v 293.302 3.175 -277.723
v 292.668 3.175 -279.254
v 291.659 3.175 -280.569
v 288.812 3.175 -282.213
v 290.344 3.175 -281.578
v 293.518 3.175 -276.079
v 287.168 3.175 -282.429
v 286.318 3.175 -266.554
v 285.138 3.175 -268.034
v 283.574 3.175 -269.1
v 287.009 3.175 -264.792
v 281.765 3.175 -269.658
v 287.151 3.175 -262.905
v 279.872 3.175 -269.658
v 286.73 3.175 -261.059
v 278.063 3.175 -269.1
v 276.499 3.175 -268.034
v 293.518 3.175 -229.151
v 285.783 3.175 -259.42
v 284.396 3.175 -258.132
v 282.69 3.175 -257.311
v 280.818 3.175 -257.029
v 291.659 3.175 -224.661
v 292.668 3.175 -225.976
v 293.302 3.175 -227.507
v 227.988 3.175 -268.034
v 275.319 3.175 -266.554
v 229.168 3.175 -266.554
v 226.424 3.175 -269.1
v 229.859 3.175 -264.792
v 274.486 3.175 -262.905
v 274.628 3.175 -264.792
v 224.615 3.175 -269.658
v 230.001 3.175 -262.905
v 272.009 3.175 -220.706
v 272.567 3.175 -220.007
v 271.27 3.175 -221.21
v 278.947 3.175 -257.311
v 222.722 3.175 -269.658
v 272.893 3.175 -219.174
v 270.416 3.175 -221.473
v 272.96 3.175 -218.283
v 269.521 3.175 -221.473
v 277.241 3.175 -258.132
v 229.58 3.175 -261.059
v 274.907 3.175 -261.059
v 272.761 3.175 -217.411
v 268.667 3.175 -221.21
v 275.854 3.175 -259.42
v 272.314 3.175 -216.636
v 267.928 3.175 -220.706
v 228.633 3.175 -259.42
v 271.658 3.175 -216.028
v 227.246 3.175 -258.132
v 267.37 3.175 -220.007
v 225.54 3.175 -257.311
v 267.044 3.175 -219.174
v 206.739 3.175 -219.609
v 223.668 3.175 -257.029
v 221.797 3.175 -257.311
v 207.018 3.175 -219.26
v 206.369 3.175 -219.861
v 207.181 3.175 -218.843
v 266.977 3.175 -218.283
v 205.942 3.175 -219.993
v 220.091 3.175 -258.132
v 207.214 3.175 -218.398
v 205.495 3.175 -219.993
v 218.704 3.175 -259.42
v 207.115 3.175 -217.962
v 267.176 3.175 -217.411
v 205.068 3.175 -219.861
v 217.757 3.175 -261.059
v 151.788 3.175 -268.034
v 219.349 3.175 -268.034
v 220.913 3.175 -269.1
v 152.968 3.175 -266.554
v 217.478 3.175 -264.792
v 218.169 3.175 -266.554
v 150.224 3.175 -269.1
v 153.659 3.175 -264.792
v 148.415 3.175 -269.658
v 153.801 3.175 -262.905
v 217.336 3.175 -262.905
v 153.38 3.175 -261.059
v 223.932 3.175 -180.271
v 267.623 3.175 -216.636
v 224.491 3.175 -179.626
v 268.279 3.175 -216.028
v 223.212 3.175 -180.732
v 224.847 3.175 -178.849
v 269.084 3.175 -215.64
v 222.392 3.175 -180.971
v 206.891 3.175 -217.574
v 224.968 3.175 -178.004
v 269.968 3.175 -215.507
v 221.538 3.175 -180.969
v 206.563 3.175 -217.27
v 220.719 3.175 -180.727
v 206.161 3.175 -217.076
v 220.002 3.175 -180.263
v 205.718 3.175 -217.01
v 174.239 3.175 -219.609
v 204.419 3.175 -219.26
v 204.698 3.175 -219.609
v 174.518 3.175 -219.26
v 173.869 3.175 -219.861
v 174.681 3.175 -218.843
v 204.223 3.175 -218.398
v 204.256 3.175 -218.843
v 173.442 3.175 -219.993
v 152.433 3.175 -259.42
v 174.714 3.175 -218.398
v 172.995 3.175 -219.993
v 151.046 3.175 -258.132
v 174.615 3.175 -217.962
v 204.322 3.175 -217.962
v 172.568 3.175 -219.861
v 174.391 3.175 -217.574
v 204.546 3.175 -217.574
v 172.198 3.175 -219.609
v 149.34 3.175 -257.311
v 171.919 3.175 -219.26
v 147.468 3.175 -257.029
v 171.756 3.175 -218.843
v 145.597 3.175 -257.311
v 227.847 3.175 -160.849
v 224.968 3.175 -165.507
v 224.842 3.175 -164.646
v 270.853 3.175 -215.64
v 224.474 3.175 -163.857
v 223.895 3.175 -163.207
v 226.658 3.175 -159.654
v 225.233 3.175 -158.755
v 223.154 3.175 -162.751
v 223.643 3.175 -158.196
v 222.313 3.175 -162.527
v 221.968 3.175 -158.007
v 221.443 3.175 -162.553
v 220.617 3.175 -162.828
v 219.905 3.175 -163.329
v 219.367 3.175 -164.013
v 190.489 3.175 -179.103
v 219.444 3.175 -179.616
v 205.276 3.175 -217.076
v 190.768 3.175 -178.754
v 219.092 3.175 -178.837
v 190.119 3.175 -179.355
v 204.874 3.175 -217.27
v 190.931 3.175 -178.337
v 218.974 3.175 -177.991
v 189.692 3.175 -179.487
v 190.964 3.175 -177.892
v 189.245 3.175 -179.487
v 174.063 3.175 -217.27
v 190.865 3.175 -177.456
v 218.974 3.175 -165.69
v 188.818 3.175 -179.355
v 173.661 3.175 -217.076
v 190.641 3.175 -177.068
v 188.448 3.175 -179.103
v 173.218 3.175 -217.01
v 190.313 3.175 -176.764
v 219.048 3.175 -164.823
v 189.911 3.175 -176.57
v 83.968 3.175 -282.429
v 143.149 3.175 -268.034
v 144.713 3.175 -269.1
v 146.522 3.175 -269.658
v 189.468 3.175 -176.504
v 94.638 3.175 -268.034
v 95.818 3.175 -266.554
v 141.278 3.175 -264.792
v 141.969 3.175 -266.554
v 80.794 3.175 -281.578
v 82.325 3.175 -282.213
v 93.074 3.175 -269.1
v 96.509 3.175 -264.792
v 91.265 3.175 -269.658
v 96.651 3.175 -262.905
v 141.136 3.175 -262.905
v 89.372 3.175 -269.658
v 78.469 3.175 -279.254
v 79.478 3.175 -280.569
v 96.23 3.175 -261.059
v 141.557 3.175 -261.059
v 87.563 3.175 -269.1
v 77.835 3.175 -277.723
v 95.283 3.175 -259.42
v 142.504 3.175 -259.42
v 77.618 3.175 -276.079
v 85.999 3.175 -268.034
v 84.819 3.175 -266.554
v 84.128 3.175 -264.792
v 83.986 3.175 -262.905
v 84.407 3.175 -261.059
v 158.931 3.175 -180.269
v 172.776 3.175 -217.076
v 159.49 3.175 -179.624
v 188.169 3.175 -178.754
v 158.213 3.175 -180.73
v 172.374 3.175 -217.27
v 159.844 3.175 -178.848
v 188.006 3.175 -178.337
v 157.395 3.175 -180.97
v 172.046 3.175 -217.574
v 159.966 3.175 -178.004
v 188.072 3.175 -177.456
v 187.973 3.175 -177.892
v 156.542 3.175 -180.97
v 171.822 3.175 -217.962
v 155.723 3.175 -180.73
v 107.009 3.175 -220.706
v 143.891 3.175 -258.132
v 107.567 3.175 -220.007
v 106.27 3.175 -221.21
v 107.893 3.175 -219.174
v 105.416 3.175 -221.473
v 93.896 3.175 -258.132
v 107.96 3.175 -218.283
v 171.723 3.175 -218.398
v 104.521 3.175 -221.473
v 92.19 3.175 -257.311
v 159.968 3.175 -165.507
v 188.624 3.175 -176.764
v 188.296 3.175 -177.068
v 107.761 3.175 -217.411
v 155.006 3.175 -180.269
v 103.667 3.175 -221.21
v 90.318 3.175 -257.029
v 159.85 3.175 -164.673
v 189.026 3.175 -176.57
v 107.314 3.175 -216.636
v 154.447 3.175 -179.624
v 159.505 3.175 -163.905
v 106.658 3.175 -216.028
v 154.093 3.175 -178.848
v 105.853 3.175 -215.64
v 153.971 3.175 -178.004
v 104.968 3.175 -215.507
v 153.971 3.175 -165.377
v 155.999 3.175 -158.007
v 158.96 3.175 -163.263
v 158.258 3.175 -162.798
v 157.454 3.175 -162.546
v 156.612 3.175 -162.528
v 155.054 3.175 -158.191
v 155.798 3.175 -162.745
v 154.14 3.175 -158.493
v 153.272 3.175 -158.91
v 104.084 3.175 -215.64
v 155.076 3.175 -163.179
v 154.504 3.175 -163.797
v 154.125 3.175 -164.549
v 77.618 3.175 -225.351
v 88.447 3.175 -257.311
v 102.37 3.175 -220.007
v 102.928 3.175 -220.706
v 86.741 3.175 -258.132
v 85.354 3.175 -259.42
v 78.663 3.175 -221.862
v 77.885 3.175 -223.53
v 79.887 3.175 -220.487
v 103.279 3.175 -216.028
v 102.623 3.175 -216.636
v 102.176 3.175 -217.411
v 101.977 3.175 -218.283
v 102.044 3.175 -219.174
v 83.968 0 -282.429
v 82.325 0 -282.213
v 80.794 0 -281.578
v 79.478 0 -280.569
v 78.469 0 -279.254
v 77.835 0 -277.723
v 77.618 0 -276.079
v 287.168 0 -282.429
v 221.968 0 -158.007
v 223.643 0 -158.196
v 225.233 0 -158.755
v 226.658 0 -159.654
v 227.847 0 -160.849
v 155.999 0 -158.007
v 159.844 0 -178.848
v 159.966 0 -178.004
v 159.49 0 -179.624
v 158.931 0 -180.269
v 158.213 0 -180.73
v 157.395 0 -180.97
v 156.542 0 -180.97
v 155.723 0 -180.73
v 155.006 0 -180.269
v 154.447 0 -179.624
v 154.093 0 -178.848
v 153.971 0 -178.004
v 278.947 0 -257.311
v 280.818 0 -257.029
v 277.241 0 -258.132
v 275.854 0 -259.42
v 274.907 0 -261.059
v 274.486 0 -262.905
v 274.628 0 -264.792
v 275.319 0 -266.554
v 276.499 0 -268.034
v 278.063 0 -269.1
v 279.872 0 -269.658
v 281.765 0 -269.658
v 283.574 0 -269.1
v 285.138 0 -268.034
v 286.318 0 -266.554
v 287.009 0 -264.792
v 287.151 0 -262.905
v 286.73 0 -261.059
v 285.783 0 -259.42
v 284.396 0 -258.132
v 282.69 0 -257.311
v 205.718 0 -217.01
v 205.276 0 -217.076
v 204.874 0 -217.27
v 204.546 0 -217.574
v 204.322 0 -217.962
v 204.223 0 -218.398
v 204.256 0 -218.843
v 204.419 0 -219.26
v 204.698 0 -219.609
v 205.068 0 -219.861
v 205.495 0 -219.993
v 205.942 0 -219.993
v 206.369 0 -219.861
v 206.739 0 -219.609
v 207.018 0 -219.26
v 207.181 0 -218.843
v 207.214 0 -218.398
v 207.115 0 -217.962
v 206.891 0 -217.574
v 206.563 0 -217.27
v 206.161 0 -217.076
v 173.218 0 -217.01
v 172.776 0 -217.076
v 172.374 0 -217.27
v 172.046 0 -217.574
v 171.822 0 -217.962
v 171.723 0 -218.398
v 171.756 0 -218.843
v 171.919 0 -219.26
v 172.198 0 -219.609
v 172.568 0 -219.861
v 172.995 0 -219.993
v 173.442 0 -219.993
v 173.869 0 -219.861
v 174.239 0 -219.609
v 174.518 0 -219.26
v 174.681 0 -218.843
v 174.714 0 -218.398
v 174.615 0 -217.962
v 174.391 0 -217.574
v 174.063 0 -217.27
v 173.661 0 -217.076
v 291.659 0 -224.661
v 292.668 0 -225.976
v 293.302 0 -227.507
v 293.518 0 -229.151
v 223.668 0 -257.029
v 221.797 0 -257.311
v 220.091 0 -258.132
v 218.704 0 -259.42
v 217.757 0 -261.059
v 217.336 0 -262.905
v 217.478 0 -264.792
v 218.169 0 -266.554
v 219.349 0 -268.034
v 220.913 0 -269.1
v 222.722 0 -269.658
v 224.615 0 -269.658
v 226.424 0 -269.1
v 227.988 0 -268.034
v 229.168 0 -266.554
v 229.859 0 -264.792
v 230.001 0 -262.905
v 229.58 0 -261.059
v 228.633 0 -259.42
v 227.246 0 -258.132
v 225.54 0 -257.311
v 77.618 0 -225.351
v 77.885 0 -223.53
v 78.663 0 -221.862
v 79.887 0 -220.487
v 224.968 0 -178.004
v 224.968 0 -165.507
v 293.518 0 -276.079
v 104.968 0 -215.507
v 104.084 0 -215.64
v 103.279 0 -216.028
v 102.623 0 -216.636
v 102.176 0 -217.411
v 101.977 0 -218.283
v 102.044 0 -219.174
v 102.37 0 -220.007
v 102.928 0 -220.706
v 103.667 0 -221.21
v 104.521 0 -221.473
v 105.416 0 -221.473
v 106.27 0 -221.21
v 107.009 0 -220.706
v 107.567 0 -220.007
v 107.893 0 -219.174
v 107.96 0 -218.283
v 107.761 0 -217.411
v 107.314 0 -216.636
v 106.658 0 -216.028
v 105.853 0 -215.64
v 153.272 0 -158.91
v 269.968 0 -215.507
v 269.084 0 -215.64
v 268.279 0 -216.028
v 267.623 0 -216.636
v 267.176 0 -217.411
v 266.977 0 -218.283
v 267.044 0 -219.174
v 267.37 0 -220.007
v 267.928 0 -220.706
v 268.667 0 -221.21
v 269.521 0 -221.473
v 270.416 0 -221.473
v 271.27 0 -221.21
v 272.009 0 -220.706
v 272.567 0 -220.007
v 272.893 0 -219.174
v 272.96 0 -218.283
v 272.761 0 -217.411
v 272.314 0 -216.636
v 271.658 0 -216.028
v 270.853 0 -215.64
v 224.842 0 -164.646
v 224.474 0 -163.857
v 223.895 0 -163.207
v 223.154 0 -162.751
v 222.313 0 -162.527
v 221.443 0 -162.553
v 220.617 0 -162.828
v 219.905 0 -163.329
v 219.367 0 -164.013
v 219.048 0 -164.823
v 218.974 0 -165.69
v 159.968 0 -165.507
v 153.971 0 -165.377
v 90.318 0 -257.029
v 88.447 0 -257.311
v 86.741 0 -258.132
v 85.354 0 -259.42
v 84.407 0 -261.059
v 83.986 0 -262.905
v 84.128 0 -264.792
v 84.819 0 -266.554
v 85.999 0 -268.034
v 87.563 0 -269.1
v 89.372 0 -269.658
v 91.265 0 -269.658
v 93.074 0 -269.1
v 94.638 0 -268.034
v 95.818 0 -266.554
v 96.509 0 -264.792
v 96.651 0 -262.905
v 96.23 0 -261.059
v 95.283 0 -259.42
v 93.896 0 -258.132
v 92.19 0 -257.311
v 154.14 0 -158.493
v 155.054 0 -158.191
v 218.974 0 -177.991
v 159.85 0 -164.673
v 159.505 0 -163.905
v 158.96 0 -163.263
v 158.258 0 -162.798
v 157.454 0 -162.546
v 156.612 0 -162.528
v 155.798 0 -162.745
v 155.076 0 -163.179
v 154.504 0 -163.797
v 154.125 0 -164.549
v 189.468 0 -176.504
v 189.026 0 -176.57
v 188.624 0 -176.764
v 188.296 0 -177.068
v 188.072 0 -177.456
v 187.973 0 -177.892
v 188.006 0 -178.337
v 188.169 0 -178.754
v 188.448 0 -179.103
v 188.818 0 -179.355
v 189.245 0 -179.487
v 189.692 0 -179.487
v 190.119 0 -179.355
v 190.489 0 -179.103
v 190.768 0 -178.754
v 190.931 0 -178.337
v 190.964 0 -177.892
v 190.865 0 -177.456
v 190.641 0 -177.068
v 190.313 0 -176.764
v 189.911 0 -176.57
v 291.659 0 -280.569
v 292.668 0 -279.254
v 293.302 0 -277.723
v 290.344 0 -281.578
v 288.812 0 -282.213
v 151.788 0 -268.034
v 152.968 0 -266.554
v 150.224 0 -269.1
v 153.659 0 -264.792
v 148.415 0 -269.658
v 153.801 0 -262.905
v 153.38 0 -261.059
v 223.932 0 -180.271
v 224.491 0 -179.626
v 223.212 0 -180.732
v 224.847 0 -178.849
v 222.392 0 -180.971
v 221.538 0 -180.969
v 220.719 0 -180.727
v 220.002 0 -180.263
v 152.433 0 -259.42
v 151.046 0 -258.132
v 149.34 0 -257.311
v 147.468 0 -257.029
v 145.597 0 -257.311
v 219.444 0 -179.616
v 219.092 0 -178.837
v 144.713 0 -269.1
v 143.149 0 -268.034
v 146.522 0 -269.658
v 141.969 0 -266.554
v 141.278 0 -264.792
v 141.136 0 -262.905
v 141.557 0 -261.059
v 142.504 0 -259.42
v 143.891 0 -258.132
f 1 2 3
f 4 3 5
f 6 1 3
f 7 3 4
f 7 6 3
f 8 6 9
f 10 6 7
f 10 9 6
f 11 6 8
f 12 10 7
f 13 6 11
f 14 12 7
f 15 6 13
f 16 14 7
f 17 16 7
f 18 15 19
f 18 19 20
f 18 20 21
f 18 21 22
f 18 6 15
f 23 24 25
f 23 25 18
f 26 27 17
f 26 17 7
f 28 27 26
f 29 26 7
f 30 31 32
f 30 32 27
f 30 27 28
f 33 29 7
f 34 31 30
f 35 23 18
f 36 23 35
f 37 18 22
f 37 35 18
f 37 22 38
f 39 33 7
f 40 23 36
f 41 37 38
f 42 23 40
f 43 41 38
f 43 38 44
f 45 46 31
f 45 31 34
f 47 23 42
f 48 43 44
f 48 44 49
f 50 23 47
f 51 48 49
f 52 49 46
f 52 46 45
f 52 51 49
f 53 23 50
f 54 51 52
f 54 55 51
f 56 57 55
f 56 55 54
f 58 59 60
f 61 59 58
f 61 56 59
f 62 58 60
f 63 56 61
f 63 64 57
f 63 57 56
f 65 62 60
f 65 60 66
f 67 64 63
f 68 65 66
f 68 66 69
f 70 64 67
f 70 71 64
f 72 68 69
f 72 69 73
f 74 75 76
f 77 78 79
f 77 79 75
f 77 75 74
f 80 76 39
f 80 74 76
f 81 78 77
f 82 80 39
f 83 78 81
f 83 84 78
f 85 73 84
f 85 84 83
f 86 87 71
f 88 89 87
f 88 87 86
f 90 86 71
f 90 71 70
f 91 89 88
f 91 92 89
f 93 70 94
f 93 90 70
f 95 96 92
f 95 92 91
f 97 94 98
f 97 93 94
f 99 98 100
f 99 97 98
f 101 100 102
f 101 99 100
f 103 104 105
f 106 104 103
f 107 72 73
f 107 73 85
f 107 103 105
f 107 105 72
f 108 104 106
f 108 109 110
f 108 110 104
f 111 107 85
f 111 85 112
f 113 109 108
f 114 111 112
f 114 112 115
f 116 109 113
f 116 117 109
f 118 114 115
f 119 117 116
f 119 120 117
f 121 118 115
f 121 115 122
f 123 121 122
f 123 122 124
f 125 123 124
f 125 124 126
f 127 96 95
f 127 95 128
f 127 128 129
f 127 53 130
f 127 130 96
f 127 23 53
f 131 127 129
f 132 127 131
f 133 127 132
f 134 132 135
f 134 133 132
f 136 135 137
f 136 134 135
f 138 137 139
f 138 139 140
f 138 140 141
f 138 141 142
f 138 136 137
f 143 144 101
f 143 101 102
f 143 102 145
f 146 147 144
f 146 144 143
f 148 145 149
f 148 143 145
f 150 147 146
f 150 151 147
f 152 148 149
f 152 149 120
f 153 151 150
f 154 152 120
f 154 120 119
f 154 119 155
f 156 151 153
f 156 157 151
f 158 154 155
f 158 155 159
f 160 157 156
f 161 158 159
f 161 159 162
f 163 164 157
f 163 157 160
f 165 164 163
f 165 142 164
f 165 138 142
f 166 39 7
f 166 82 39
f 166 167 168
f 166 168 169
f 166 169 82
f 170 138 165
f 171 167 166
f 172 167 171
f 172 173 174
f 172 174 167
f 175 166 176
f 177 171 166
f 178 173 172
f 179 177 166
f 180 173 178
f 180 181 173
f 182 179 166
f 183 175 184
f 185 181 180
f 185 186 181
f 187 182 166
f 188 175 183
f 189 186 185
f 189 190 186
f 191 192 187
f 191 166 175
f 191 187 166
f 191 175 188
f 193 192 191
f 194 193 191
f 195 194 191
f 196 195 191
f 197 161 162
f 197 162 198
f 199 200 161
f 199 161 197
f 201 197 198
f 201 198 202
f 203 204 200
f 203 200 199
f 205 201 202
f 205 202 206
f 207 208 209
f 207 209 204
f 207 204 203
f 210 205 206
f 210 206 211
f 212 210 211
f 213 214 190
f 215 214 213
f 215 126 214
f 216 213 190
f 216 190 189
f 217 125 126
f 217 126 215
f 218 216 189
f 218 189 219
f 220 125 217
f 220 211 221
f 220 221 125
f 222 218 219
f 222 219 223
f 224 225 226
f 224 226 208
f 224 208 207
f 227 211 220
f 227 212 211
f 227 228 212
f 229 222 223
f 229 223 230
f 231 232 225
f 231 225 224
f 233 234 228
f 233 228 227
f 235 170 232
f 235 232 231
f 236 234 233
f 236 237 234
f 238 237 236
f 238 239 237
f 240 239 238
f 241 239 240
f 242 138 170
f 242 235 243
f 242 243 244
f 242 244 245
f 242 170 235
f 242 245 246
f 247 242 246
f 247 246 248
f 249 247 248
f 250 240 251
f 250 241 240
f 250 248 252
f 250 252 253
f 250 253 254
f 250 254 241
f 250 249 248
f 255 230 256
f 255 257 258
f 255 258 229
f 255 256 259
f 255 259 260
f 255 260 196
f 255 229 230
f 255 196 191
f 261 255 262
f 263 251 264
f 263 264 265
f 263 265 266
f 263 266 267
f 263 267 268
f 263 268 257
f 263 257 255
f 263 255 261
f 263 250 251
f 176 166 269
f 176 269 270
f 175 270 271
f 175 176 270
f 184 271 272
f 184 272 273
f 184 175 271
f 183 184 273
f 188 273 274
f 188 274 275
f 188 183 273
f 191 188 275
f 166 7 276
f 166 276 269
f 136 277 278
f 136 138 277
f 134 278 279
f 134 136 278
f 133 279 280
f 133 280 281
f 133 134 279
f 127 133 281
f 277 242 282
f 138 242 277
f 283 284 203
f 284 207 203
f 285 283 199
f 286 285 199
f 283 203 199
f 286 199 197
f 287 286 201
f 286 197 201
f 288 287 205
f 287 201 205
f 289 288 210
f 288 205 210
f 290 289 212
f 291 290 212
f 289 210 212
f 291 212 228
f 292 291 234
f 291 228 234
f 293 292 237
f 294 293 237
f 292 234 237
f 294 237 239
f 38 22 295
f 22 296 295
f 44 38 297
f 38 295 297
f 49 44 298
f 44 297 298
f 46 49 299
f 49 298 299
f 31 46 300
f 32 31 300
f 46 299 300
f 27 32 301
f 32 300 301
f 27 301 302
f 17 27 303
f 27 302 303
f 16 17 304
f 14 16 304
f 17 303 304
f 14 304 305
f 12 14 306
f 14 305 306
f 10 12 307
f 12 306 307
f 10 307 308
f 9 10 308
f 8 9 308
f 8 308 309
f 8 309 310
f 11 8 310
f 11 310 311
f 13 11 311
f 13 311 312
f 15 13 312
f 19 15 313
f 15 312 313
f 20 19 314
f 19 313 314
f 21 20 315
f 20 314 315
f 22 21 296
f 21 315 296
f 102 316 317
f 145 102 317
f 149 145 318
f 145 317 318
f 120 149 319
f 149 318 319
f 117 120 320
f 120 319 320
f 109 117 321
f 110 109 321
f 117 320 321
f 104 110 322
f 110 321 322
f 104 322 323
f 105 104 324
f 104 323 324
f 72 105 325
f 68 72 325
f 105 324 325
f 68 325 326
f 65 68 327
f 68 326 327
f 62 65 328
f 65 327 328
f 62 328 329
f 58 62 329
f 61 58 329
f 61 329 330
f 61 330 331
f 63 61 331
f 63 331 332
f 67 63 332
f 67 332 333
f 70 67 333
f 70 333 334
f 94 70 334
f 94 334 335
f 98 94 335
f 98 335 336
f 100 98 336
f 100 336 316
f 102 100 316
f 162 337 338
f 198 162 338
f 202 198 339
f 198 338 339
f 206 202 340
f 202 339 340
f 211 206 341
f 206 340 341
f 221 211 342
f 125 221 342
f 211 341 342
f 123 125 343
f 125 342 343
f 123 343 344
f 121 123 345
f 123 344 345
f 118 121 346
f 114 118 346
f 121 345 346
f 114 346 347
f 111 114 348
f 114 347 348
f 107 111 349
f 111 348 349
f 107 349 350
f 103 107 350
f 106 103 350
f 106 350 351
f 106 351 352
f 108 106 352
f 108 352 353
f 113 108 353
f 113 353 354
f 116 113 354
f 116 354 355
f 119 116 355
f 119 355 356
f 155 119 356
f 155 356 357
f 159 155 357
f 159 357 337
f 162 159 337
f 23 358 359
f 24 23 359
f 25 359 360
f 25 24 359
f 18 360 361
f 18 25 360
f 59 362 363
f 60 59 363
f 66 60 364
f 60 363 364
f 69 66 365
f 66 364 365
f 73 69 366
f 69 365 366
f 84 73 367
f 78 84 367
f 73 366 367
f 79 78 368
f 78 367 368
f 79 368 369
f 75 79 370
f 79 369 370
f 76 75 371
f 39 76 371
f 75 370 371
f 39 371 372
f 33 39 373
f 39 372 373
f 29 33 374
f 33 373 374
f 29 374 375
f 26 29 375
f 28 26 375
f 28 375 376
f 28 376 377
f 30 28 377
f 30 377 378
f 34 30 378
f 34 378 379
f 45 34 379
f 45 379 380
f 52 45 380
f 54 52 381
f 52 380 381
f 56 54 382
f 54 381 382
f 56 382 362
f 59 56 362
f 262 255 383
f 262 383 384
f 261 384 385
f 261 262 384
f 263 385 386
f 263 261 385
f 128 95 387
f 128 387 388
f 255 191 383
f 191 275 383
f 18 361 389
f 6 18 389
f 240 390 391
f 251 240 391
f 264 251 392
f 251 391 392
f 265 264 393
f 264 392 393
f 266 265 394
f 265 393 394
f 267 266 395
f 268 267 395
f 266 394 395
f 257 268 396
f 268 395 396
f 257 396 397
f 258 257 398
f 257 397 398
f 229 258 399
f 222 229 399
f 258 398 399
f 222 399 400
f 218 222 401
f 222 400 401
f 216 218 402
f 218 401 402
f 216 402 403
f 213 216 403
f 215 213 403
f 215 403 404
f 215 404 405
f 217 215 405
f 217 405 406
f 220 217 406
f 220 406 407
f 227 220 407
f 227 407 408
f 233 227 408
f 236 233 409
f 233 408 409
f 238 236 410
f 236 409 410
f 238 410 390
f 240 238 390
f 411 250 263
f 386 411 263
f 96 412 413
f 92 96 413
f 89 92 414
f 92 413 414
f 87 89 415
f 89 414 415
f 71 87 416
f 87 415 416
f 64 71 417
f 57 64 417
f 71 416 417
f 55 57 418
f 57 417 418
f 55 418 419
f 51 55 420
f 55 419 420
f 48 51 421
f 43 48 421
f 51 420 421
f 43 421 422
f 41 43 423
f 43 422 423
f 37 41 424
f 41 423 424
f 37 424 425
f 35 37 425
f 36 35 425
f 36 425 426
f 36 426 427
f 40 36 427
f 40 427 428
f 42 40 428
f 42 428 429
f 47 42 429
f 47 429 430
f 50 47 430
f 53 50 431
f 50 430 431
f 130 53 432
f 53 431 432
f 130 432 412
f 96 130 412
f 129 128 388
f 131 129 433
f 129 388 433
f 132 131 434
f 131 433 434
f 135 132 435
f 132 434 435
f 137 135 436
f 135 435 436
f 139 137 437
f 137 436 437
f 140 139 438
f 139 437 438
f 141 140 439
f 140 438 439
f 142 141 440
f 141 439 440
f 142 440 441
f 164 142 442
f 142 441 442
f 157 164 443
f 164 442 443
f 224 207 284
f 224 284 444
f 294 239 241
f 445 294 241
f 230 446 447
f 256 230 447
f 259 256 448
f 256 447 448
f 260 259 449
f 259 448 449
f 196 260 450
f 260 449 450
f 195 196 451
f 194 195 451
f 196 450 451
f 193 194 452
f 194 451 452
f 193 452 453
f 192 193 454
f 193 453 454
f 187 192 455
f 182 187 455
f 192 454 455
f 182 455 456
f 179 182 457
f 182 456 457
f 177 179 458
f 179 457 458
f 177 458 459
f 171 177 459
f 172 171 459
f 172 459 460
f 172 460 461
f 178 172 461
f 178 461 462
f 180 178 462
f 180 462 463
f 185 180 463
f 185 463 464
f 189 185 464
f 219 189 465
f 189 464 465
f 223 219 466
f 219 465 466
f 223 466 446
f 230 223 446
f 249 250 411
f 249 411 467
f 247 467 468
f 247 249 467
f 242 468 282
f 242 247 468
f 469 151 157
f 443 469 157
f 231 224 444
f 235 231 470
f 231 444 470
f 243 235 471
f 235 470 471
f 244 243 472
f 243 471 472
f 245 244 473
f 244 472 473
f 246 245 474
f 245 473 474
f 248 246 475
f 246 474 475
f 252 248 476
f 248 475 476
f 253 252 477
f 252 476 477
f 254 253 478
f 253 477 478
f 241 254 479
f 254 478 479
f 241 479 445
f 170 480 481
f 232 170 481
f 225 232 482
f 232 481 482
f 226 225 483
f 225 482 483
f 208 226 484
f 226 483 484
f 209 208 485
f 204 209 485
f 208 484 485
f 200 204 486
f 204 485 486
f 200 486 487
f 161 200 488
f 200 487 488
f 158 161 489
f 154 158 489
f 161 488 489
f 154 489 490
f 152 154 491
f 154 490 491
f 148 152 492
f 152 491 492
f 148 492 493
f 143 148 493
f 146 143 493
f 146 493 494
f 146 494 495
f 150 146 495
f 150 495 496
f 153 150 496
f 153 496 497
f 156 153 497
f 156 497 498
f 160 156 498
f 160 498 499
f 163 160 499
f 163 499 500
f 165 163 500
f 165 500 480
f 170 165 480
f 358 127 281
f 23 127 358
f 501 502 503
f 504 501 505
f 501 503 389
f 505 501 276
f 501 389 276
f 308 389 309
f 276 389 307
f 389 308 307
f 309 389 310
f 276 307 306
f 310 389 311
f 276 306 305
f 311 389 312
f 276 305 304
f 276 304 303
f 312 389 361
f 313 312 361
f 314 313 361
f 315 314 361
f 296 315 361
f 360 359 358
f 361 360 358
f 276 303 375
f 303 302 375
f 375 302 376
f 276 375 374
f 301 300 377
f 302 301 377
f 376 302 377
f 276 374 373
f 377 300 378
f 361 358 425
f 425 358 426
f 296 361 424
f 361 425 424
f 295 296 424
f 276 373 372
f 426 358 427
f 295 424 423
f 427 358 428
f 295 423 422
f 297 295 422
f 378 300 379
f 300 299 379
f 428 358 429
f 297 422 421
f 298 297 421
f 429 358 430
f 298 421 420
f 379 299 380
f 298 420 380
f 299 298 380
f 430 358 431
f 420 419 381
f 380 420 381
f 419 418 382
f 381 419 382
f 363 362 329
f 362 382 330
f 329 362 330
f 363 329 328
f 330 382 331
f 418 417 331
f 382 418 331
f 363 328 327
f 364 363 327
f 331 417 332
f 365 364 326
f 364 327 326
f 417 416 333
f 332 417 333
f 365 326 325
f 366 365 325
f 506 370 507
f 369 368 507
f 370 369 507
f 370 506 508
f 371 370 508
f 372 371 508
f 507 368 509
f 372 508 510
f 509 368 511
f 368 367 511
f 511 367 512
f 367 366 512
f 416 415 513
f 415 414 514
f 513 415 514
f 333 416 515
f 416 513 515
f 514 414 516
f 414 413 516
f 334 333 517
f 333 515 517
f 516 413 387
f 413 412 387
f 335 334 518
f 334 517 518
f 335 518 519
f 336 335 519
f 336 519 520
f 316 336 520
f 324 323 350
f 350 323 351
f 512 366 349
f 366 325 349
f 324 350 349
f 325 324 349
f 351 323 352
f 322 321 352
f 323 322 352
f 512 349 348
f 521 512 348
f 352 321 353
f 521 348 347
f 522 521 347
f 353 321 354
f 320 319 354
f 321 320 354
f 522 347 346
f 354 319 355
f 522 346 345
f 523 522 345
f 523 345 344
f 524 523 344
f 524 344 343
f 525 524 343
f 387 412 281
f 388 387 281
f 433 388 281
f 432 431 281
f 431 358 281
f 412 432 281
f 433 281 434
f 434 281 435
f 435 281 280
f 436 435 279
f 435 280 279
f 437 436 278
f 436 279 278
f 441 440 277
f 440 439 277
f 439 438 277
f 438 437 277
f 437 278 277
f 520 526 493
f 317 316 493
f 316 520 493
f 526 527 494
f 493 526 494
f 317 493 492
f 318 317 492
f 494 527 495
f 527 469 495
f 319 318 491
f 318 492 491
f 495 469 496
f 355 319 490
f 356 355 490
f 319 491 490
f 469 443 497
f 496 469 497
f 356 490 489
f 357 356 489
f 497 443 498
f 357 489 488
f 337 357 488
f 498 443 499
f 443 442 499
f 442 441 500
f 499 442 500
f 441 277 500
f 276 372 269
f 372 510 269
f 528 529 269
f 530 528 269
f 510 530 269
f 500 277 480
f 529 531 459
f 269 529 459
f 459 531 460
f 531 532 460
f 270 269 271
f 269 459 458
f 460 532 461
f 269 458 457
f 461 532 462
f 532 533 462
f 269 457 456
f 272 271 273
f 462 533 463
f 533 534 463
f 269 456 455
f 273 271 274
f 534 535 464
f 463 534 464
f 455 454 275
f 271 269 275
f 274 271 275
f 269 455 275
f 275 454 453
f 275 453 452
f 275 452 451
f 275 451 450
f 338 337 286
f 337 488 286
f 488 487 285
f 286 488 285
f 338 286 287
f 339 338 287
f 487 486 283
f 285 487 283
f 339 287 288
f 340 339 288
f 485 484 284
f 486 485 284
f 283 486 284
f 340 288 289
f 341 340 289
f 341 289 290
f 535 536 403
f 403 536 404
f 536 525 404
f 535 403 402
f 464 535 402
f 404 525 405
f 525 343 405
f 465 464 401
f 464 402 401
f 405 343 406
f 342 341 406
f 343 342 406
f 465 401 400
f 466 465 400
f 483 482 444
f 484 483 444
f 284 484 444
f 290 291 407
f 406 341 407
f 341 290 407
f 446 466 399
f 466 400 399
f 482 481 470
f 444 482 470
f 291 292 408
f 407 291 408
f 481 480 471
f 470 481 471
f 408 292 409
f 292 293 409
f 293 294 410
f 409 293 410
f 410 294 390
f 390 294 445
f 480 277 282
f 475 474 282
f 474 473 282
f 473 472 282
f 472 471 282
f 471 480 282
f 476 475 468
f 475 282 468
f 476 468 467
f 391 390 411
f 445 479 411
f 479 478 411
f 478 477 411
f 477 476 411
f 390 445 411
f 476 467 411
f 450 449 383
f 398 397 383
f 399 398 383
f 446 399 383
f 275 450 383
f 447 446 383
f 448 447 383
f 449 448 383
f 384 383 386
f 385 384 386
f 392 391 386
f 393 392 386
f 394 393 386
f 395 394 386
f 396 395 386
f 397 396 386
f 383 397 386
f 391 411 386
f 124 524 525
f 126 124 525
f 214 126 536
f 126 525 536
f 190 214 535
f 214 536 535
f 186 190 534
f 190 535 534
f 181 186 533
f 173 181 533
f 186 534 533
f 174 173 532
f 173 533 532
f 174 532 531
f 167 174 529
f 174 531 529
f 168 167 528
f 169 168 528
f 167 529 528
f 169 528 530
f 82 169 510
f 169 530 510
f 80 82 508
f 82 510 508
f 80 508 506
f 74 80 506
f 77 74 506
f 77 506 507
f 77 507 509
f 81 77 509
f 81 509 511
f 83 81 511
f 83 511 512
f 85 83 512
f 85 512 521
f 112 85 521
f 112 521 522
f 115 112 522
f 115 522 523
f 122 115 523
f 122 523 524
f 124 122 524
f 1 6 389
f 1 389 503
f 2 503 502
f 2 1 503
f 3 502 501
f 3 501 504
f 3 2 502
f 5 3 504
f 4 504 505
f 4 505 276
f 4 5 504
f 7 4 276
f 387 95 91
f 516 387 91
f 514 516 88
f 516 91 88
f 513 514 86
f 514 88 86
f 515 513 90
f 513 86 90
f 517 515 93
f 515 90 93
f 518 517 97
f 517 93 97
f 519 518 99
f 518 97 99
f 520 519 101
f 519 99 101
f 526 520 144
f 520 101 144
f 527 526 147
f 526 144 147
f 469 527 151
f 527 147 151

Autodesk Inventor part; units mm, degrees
ref_plane "YZ Plane" through (0, 0, 0) normal (1, 0, 0) x (0, 1, 0)
ref_plane "XZ Plane" through (0, 0, 0) normal (0, 1, 0) x (-1, 0, 0)
ref_plane "XY Plane" through (0, 0, 0) normal (0, 0, 1) x (1, 0, 0)
sketch "Sketch1" plane through (0, 0, 0) normal (0, 1, 0) x (-1, 0, 0)
  line L0 (-77.6185, -139.5068) -> (-293.5185, -139.5068)
  line L1 (-293.5185, -139.5068) -> (-293.5185, -291.9068)
  line L2 (-293.5185, -291.9068) -> (-77.6185, -291.9068)
  line L3 (-77.6185, -291.9068) -> (-77.6185, -139.5068)
  point P0 (0, 0)
  dimension "d0" = 215.9
  dimension "d1" = 152.4
extrude "Extrusion1" add sketch "Sketch1" along normal blind 3.175
sketch "Sketch2" plane through (0, 3.175, 0) normal (0, 1, 0) x (1, 0, 0)
  line L0 (77.6185, 291.9068) -> (77.6185, 139.5068) projected
  line L1 (77.6185, 139.5068) -> (293.5185, 139.5068) projected
  line L2 (293.5185, 139.5068) -> (293.5185, 291.9068) projected
  line L3 (293.5185, 291.9068) -> (77.6185, 291.9068) projected
  point P0 (0, 0)
  point P1 (156.9685, 165.5068)
  point P2 (104.9685, 218.5068)
  point P3 (269.9685, 218.5068)
  point P4 (221.9685, 165.5068)
  dimension "d4" = 144.35
  dimension "d5" = 26
  dimension "d7" = 79
  dimension "d19" = 27.35
  dimension "d20" = 79
  dimension "d21" = 26
  dimension "d22" = 79.35
  dimension "d23" = 192.35
hole "Hole1" at (156.9685, 3.175, -165.5068) at (104.9685, 3.175, -218.5068) at (269.9685, 3.175, -218.5068) at (221.9685, 3.175, -165.5068) direction (0, -1, 0) diameter 6 end through all
sketch "Sketch3" plane through (0, 3.175, 0) normal (0, 1, 0) x (1, 0, 0)
  line L0 (155.9994, 158.0068) -> (221.9685, 158.0068)
  circle A0 centre (221.9685, 165.5068) radius 3 projected
  circle A1 centre (104.3905, 218.5068) radius 3
  circle A2 centre (156.9685, 165.5068) radius 3 projected
  line L1 (153.2717, 158.9097) -> (79.8868, 220.4869)
  line L2 (77.6185, 139.5068) -> (293.5185, 139.5068)
  line L3 (293.5185, 229.1509) -> (293.5185, 276.0791)
  line L4 (293.5185, 291.9068) -> (77.6185, 291.9068)
  line L5 (77.6185, 291.9068) -> (77.6185, 139.5068)
  arc A3 (153.2717, 158.9097) -> (155.9994, 158.0068) centre (156.9685, 165.5068) ccw
  line L6 (96.6333, 206.4349) -> (77.6185, 222.3902)
  line L7 (48.2791, 233.5068) -> (391.5458, 233.5068) construction
  arc A4 (221.9685, 158.0068) -> (227.8466, 160.8487) centre (221.9685, 165.5068) ccw
  line L8 (227.8466, 160.8487) -> (291.6586, 224.6608)
  line L9 (293.5185, 226.5206) -> (293.5185, 282.4291)
  line L10 (293.5185, 139.5068) -> (293.5185, 291.9068) projected
  line L11 (287.1685, 282.4291) -> (83.9685, 282.4291)
  line L12 (77.6185, 276.0791) -> (77.6185, 225.3513)
  line L13 (77.6185, 291.9068) -> (77.6185, 139.5068) projected
  arc A5 (293.5185, 276.0791) -> (287.1685, 282.4291) centre (287.1685, 276.0791) ccw
  arc A6 (83.9685, 282.4291) -> (77.6185, 276.0791) centre (83.9685, 276.0791) ccw
  arc A7 (77.6185, 225.3513) -> (79.8868, 220.4869) centre (83.9685, 225.3513) ccw
  arc A8 (291.6586, 224.6608) -> (293.5185, 229.1509) centre (287.1685, 229.1509) ccw
  circle A9 centre (104.9685, 218.5068) radius 3 projected
  line L14 (104.9685, 218.5068) -> (170.1885, 218.5068)
  point P0 (0, 0)
  point P1 (77.6185, 282.4291)
  point P2 (77.6185, 160.8487)
  dimension "d24" = 7.5
  dimension "d40" = 98.7582
  dimension "d72" = 6
  dimension "d93" = 7.5
  dimension "d96" = 52.578
  dimension "d99" = 135
  dimension "d100" = 6.35
  dimension "d101" = 6.35
  dimension "d102" = 6.35
  dimension "d103" = 6.35
  dimension "d104" = 140
  dimension "d127" = 9.4778
  dimension "d128" = 53
extrude "Extrusion3" cut sketch "Sketch3" against normal blind 25.4 contours L0 A4 L8 A8 L9 L10 L2 L5 L6 L1 A3 | L6 L5 A7 | A5 L11 A6 L5 L4 L10 L9
sketch "Sketch7" plane through (0, 3.175, 0) normal (0, 1, 0) x (1, 0, 0)
  circle A0 centre (156.9685, 165.5068) radius 3 projected
  line L0 (155.9994, 158.0068) -> (221.9685, 158.0068) projected
  circle A1 centre (156.9685, 178.0036) radius 2.9972
  line L1 (153.9713, 178.0036) -> (153.9713, 165.3773)
  line L2 (159.9657, 178.0043) -> (159.9685, 165.5075)
  circle A2 centre (221.9713, 178.0036) radius 2.9972
  circle A3 centre (221.9685, 165.5068) radius 3 projected
  line L3 (218.9741, 178.016) -> (218.9741, 165.3232)
  line L4 (224.9685, 178.0036) -> (224.9685, 165.5068)
  point P0 (0, 0)
  point P1 (218.9685, 165.5082)
  dimension "d76" = 5.9944
  dimension "d77" = 12.4968
  dimension "d78" = 5.9944
  dimension "d79" = 12.4968
  dimension "d88" = 6
extrude "Extrusion4" cut sketch "Sketch7" against normal blind 25.4 contours A0 L1 A1 L2 | A1
sketch "Sketch8" plane through (0, 3.175, 0) normal (0, 1, 0) x (1, 0, 0)
  arc A0 (224.9685, 178.0036) -> (218.9741, 177.9913) centre (221.9713, 178.0036) ccw
  circle A1 centre (221.9685, 165.5068) radius 3
  line L0 (218.9741, 178.016) -> (218.9741, 165.3232)
  line L1 (224.9685, 178.0036) -> (224.9685, 165.5068)
  point P0 (0, 0)
  point P1 (218.9685, 165.5082)
  dimension "d82" = 5.9944
  dimension "d83" = 12.4968
extrude "Extrusion5" cut sketch "Sketch8" against normal blind 25.4 contours L1 A1 L0 A0 | A1 L0 picked at (221.9464, 164.5591)
sketch "Sketch10" plane through (0, 3.175, 0) normal (0, 1, 0) x (1, 0, 0)
  line L0 (77.6185, 276.0791) -> (77.6185, 225.3513) projected
  line L1 (77.6185, 276.0791) -> (77.6185, 225.3513) construction
  line L2 (77.6185, 263.3791) -> (375.3248, 263.3791) construction
  line L3 (287.1685, 282.4291) -> (83.9685, 282.4291) projected
  line L4 (77.6185, 263.3791) -> (77.6185, 263.3791)
  point P0 (90.3185, 263.3791)
  point P1 (147.4685, 263.3791)
  point P2 (223.6685, 263.3791)
  point P3 (280.8185, 263.3791)
  dimension "d110" = 12.7
  dimension "d111" = 57.15
  dimension "d112" = 76.2
  dimension "d113" = 57.15
  dimension "d116" = 0.107
  dimension "d117" = 19.05
hole "Hole3" at (90.3185, 3.175, -263.3791) at (147.4685, 3.175, -263.3791) at (223.6685, 3.175, -263.3791) at (280.8185, 3.175, -263.3791) direction (0, -1, 0) diameter 12.7 depth 25.4 tip angle 118
sketch "Sketch5" plane through (0, 3.175, 0) normal (0, 1, 0) x (1, 0, 0)
  circle A0 centre (104.9685, 218.5068) radius 3 projected
  circle A1 centre (104.9685, 218.5068) radius 22.225
  circle A2 centre (156.9685, 165.5068) radius 3 projected
  circle A3 centre (156.9685, 165.5068) radius 22.225
  circle A4 centre (221.9685, 165.5068) radius 3 projected
  circle A5 centre (221.9685, 165.5068) radius 22.225
  circle A6 centre (269.9685, 218.5068) radius 3 projected
  circle A7 centre (269.9685, 218.5068) radius 22.225
  line L0 (155.9994, 158.0068) -> (221.9685, 158.0068) projected
  arc A8 (224.9685, 178.0036) -> (218.9741, 178.016) centre (221.9713, 178.0036) ccw projected
  line L1 (287.1685, 282.4291) -> (83.9685, 282.4291) projected
  point P0 (0, 0)
  point P1 (205.7185, 218.5096)
  point P2 (189.4685, 178.0036)
  point P3 (173.2185, 218.5096)
  dimension "d45" = 44.45
  dimension "d47" = 44.45
  dimension "d48" = 44.45
  dimension "d49" = 44.45
  dimension "d50" = 60.5028
  dimension "d52" = 65
  dimension "d53" = 16.25
  dimension "d54" = 16.25
  dimension "d55" = 60.5028
  dimension "d58" = 52
  dimension "d62" = 32.5
  dimension "d125" = 0
  dimension "d126" = 63.9194
hole "Hole2" at (205.7185, 3.175, -218.5096) at (189.4685, 3.175, -178.0036) at (173.2185, 3.175, -218.5096) direction (0, -1, 0) diameter 3 end through all
equation "\"d78\" = d76"
equation "\"d79\" = d77"
equation "\"d82\" = d84"
equation "\"d83\" = d85"
equation "\"d47\" = d45"
equation "\"d48\" = d45"
equation "\"d49\" = d48"
equation "\"d53\" = 0.25 * d52"
equation "\"d54\" = d53"
equation "\"d55\" = d50"
equation "\"d62\" = 0.5 * d52"
equation "\"d84\" = 5.9944"
equation "\"d85\" = 12.4968"
properties part number "track side panel V1"
